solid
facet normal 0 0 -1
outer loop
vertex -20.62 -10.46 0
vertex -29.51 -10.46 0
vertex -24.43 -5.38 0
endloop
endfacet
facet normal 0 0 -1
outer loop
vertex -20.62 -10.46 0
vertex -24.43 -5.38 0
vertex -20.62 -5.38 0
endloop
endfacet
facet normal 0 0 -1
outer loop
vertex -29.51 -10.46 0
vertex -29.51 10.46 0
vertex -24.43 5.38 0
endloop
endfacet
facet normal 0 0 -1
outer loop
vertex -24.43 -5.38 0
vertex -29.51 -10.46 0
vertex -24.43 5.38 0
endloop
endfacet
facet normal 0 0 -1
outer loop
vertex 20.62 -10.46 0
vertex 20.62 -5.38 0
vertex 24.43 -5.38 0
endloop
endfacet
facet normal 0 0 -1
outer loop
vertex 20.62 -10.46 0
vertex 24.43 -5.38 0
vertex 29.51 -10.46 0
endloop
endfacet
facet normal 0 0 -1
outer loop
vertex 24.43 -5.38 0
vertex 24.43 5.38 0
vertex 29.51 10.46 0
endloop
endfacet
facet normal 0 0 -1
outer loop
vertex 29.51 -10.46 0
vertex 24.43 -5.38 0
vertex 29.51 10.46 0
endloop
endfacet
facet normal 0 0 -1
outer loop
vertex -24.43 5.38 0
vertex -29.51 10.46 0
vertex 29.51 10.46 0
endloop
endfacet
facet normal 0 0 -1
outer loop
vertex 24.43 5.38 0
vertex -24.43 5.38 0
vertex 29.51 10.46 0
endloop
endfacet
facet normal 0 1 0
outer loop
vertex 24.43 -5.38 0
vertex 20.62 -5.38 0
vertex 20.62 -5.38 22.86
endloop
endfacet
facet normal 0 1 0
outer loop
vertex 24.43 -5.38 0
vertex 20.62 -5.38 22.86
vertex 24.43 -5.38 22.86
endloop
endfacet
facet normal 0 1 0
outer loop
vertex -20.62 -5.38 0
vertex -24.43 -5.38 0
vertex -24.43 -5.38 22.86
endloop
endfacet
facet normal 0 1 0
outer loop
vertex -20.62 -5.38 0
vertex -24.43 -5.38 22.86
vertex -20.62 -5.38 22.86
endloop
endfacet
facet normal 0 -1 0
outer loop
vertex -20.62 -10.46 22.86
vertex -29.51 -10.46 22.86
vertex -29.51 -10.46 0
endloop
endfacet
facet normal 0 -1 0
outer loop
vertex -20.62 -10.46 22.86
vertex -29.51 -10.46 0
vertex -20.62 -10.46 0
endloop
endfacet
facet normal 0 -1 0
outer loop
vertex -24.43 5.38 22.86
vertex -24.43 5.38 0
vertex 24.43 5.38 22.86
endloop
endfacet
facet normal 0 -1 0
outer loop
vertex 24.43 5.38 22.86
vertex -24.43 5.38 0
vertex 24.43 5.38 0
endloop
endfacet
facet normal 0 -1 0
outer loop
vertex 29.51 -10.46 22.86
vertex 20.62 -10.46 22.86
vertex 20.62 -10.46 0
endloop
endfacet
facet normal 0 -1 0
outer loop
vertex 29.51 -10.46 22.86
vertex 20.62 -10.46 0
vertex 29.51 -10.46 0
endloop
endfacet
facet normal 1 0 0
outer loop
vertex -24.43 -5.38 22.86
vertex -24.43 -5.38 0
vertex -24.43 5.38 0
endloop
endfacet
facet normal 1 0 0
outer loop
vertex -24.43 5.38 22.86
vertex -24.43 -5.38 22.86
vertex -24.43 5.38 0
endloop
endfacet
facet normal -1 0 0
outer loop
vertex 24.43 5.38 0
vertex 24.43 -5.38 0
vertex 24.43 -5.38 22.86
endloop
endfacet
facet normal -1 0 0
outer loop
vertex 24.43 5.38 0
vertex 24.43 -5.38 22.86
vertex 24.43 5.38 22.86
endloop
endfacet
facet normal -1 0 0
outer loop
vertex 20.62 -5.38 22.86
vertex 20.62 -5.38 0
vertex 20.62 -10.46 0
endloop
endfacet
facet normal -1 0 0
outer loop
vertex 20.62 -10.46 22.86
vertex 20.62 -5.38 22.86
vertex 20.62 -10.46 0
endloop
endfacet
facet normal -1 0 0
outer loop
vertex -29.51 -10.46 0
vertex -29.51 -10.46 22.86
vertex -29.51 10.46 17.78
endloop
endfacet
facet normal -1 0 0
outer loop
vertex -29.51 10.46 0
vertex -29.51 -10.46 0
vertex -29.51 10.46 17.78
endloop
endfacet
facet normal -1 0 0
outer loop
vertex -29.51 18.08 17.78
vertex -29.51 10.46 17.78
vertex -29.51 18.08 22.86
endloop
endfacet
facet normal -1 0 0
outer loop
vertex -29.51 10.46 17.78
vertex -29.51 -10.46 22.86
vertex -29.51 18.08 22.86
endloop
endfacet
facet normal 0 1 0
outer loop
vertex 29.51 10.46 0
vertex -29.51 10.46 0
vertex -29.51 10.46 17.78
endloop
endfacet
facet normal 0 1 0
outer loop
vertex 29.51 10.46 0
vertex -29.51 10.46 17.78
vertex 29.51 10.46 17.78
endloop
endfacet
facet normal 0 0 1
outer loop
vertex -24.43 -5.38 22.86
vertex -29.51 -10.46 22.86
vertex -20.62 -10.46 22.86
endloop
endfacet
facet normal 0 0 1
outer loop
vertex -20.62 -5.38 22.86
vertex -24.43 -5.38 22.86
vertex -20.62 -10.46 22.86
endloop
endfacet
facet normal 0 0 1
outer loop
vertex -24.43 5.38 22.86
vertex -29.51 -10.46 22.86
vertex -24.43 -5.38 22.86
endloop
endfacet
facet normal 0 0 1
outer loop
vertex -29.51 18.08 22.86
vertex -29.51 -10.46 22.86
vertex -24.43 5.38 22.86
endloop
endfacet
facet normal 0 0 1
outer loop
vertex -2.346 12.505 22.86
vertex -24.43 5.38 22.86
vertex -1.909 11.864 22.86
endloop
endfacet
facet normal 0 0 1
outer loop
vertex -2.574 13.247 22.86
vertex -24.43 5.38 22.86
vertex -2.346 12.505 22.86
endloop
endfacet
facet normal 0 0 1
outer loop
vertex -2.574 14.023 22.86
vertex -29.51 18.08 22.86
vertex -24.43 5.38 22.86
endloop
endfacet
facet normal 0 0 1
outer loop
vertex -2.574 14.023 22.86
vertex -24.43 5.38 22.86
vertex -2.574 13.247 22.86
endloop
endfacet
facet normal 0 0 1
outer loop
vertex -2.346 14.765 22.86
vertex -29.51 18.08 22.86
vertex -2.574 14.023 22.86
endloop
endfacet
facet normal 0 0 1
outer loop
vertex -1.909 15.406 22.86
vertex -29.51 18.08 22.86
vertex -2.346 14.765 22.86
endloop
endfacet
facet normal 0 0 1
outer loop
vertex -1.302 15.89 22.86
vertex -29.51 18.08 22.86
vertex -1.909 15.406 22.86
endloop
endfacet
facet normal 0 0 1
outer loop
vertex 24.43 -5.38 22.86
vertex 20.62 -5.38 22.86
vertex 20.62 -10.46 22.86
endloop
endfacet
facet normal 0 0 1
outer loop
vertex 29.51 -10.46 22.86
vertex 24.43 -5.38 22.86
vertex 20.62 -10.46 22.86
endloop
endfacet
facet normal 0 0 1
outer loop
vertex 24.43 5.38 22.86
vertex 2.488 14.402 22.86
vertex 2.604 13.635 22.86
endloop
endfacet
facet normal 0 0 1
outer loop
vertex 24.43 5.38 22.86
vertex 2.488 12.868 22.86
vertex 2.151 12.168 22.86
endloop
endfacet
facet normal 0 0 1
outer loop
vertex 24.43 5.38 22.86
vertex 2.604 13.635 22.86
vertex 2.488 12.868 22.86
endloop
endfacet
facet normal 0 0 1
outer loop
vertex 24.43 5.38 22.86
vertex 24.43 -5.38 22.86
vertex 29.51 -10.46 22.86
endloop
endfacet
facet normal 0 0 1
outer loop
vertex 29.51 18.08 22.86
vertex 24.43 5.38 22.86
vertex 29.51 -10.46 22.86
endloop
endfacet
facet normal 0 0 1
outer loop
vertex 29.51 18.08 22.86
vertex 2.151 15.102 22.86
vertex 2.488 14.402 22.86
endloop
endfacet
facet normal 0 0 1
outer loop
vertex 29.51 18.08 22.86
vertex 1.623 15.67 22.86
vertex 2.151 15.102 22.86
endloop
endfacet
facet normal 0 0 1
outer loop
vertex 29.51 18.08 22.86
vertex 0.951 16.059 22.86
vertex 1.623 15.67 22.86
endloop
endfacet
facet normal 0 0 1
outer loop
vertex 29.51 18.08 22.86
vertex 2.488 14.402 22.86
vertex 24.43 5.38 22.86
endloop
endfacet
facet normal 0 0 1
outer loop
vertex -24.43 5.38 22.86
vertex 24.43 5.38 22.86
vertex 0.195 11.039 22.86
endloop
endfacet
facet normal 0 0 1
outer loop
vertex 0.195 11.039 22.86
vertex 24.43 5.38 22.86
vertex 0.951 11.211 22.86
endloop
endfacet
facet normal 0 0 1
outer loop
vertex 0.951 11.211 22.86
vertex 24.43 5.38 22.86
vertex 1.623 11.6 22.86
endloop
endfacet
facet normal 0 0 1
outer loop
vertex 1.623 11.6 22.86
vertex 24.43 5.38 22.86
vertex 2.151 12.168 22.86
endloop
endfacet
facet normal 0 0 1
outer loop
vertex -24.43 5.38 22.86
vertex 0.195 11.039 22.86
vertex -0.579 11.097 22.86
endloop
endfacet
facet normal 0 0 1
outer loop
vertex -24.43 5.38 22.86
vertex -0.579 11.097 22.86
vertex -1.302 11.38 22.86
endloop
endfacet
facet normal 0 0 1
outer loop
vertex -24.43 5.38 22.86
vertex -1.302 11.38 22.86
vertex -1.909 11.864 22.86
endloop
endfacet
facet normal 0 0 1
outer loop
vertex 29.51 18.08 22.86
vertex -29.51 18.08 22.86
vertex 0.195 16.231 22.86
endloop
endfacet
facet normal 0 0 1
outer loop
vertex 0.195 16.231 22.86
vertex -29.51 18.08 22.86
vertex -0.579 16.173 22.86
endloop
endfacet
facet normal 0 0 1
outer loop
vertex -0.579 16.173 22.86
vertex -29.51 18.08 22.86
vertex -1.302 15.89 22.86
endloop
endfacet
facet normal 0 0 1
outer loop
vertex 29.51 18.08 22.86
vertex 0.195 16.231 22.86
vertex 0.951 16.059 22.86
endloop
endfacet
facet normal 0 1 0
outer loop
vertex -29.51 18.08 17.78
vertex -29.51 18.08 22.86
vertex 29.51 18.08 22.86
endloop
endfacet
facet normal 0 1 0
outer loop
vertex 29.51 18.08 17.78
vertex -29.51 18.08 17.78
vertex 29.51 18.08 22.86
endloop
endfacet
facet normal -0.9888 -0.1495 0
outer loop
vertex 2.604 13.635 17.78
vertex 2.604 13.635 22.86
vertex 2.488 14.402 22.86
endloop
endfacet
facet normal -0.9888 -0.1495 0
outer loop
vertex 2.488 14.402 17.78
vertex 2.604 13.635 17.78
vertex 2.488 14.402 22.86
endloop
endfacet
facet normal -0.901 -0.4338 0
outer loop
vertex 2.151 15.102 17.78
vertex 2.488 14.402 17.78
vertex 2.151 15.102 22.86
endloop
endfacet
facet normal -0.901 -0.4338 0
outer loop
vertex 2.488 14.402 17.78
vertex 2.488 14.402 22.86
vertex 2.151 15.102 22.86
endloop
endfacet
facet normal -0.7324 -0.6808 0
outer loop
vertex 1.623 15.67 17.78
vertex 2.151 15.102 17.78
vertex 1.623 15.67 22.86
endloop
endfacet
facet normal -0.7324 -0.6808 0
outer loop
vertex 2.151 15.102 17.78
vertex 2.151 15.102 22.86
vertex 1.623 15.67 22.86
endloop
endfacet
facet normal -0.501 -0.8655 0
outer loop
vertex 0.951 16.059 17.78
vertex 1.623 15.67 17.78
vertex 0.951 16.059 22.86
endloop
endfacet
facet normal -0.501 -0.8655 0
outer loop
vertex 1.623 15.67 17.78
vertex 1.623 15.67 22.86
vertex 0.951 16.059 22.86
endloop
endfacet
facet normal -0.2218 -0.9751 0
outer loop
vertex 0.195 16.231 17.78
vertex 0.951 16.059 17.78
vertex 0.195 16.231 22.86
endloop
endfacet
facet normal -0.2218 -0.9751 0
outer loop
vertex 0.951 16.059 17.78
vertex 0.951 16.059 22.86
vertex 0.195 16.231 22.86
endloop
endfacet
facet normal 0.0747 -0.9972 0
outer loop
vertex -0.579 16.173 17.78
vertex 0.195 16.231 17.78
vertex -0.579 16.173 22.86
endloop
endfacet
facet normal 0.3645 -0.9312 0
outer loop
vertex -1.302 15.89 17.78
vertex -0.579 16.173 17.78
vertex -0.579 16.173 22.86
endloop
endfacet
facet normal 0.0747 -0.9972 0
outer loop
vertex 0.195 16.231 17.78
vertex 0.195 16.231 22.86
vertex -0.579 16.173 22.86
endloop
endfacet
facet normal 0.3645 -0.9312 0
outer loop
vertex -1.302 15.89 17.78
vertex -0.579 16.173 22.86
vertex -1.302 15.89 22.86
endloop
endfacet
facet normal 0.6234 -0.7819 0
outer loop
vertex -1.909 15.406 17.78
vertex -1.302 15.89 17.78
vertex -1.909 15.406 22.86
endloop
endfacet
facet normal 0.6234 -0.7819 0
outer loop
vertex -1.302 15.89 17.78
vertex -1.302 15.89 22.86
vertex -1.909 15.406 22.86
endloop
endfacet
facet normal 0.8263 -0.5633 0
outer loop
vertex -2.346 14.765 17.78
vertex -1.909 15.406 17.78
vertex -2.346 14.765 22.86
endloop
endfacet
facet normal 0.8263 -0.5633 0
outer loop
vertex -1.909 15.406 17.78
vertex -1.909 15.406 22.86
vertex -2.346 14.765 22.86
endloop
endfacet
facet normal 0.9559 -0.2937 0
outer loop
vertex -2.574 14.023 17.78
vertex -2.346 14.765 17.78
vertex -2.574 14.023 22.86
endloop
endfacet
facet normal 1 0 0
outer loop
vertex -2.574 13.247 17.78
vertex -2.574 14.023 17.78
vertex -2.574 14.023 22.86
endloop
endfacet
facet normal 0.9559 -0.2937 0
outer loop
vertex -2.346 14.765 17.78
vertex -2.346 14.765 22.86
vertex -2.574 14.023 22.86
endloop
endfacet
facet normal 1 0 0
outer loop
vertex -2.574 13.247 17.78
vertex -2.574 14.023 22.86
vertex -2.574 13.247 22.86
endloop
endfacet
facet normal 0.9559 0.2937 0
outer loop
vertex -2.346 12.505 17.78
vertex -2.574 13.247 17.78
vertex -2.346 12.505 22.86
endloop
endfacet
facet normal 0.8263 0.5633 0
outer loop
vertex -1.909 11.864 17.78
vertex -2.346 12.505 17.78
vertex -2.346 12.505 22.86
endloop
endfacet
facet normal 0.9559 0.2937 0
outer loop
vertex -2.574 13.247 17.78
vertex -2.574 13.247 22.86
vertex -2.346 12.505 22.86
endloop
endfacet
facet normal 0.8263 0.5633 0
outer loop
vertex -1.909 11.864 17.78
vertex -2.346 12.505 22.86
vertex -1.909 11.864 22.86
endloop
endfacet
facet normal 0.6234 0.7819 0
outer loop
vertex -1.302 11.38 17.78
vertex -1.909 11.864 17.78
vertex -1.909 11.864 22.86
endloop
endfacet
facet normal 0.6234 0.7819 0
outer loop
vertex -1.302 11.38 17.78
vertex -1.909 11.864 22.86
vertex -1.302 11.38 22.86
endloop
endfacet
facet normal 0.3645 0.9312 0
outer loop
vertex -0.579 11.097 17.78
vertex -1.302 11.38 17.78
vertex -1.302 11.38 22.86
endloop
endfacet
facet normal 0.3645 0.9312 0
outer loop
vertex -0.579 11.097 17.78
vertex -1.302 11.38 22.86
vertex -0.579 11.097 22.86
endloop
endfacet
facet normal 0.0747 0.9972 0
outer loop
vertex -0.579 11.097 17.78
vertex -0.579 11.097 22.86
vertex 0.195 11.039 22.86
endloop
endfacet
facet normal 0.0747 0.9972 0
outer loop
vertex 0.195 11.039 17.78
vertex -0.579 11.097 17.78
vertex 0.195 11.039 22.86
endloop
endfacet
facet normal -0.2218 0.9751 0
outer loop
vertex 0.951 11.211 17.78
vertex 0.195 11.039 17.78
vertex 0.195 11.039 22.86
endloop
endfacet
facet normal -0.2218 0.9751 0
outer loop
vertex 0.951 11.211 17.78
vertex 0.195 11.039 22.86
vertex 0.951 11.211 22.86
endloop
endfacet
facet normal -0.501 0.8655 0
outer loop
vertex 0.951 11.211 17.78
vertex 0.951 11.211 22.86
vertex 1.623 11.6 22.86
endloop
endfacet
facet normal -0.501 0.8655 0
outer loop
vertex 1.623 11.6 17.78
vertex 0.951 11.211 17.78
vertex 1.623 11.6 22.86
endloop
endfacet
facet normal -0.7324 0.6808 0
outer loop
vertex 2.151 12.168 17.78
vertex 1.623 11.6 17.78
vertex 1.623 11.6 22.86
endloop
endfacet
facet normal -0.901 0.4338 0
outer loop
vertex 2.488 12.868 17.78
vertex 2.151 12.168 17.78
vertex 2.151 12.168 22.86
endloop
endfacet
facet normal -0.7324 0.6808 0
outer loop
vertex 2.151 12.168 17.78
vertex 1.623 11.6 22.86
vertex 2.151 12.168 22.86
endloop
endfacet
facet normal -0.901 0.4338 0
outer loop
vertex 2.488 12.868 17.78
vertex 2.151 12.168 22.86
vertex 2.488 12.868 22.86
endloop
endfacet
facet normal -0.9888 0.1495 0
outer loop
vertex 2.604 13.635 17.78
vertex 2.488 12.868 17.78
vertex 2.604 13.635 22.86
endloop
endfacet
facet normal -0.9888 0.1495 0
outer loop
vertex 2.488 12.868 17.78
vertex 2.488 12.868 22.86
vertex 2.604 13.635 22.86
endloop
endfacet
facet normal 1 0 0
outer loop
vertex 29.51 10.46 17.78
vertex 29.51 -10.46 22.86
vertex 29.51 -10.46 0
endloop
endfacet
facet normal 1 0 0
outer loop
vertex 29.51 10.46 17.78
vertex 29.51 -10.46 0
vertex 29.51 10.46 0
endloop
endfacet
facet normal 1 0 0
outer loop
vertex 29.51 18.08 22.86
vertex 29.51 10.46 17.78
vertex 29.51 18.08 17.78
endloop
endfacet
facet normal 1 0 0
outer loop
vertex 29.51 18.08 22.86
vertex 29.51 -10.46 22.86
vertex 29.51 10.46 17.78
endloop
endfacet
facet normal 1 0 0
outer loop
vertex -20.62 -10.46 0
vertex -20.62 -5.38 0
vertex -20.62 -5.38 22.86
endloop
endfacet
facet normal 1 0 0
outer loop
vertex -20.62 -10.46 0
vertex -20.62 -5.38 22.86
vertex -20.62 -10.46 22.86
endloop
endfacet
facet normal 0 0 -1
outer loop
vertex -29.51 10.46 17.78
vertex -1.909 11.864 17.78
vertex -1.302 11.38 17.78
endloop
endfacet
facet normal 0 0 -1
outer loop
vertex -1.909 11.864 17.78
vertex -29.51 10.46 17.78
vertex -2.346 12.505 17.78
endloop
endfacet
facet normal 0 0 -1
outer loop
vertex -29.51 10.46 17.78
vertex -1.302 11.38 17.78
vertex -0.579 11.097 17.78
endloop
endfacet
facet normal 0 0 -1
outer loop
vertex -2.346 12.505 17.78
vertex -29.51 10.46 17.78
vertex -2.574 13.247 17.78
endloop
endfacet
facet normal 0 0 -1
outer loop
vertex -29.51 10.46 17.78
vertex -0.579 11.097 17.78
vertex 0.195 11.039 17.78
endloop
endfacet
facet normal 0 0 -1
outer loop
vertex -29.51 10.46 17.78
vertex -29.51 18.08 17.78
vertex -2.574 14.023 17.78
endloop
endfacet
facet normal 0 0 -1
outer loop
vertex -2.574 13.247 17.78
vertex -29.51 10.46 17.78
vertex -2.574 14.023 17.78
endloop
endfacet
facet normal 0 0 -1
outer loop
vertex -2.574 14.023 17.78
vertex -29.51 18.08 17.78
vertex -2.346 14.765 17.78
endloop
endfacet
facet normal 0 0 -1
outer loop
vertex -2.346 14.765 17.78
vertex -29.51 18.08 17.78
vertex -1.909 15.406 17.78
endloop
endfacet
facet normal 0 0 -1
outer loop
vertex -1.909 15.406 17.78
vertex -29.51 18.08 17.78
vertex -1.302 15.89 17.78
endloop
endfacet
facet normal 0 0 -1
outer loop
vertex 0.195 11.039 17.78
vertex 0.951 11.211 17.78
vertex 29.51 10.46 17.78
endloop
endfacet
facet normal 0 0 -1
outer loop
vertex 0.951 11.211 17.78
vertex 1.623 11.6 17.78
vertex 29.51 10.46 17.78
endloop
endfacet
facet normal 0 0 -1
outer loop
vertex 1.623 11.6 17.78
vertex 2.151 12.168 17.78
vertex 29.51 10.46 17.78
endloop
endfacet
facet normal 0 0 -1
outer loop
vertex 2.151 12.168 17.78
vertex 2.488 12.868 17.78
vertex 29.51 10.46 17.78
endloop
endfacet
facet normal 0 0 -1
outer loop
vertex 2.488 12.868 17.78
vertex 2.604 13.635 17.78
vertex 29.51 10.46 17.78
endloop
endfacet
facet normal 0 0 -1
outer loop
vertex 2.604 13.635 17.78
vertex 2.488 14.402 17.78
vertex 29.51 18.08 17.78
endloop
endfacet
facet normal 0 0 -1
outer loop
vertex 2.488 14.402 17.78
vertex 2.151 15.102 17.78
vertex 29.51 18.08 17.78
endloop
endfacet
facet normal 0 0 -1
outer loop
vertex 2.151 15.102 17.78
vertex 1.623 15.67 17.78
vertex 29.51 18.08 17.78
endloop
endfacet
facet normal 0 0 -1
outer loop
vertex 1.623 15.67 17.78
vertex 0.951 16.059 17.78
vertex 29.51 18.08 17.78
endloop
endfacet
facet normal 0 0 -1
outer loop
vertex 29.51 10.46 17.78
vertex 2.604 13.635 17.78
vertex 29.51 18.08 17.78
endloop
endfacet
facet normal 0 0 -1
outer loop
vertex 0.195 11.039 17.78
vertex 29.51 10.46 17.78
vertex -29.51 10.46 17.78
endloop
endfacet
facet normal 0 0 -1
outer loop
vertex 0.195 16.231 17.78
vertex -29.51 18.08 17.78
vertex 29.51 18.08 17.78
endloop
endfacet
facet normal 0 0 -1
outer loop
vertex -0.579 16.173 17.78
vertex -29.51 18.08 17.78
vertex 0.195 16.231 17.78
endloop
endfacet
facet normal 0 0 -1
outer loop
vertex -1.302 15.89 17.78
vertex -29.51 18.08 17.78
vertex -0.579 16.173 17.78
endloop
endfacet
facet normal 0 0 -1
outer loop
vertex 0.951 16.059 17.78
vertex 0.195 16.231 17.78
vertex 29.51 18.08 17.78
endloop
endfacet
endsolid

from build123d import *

# Parameters (mm, degrees)
F0_W     = 59.02
F0_H     = 20.92
F0_W_2   = 48.86
F0_H_2   = 10.76
F1_DEPTH = 22.86
F2_W     = 59.02
F2_H     = 7.62
F2_R     = 2.6035
F3_DEPTH = 5.08
F4_W     = 41.24
F4_H     = 5.08
F5_DEPTH = 22.861


with BuildPart() as f1:
    # F0 (on Top) → F1 (new body)
    with BuildSketch(Plane.XY):
        Rectangle(F0_W, F0_H)
        Rectangle(F0_W_2, F0_H_2, mode=Mode.SUBTRACT)
    extrude(amount=F1_DEPTH)

    # F2 (on face) → F3 (join)
    with BuildSketch(Plane.XY.offset(22.86)):
        with Locations((0, 14.27)):
            Rectangle(F2_W, F2_H)
        with Locations((0, 13.635)):
            Circle(F2_R, mode=Mode.SUBTRACT)
    extrude(amount=-F3_DEPTH)

    # F4 (on face) → F5 (cut, through all)
    with BuildSketch(Plane(origin=(0, 0, 0), x_dir=(1, 0, 0), z_dir=(0, 0, -1))):
        with Locations((0, 7.92)):
            Rectangle(F4_W, F4_H)
    extrude(amount=-F5_DEPTH, mode=Mode.SUBTRACT)


solid = f1.part
